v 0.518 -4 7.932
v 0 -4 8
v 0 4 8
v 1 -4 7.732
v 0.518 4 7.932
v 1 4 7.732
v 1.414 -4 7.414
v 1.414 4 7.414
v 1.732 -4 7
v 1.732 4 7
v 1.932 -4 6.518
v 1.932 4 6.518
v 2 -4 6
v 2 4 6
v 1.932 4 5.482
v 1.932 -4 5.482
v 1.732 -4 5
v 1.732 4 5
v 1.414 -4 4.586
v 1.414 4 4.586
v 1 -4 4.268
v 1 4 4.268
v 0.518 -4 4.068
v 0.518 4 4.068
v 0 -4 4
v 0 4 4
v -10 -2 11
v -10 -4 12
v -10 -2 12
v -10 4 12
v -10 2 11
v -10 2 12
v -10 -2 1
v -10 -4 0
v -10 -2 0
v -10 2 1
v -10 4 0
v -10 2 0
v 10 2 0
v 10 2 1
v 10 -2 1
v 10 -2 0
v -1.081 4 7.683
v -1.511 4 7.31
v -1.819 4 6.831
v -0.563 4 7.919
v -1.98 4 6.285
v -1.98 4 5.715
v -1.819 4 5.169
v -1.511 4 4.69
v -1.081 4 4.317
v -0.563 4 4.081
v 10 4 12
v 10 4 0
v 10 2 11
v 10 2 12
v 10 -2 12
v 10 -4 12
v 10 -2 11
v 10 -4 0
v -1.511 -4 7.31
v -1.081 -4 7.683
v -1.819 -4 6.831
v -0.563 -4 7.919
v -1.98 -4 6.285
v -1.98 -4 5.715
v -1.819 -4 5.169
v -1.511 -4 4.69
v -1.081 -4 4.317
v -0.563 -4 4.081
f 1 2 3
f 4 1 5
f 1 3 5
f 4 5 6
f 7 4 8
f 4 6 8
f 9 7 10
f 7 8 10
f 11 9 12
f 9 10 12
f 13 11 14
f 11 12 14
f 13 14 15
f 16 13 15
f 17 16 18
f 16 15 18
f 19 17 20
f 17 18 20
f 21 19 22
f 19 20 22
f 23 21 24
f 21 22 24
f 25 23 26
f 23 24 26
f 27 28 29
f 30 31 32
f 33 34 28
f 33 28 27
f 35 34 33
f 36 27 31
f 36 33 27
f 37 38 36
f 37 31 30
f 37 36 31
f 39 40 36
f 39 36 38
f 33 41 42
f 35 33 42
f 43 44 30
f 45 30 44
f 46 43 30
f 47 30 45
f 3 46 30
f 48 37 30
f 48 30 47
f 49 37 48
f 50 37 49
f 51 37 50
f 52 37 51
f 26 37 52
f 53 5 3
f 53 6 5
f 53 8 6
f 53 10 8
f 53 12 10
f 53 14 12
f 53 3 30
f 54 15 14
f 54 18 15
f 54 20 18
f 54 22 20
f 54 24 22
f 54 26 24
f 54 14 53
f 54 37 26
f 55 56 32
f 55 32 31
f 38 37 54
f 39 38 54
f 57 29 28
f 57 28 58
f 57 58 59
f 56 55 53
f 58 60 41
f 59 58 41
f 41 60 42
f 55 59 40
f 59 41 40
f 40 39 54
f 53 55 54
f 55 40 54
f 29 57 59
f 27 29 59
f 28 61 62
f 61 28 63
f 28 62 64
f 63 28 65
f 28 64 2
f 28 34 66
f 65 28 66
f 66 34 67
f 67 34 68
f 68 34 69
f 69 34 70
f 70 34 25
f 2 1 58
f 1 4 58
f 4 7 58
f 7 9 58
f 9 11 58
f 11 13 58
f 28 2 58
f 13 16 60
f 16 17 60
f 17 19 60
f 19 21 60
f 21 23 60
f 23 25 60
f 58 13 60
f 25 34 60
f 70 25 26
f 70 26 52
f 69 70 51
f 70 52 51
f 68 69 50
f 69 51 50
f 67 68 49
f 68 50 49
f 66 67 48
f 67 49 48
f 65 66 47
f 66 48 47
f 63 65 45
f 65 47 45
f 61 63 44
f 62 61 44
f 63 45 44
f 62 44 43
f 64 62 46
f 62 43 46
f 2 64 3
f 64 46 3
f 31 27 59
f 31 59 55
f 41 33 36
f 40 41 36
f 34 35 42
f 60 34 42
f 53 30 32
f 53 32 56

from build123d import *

# Parameters (mm, degrees)
SKETCH_1_W          = 20
SKETCH_1_H          = 8
EXTRUDE_1_DEPTH     = 12
SKETCH_2_W          = 1
SKETCH_2_H          = 4
CUT_EXTRUDE_3_DEPTH = 21
CUT_EXTRUDE_4_DEPTH = 9


with BuildPart() as part:
    # 草图1 → 凸台-拉伸1 (new body)
    with BuildSketch(Plane.XY):
        Rectangle(SKETCH_1_W, SKETCH_1_H)
    extrude(amount=EXTRUDE_1_DEPTH)

    # 草图2 → 切除-拉伸3 (cut, through all)
    with BuildSketch(Plane(origin=(10, 0, 0), x_dir=(0, 0, -1), z_dir=(1, 0, 0))):
        with Locations((-0.5, 0)):
            Rectangle(SKETCH_2_W, SKETCH_2_H)
        with Locations((-11.5, 0)):
            Rectangle(SKETCH_2_W, SKETCH_2_H)
    extrude(amount=-CUT_EXTRUDE_3_DEPTH, mode=Mode.SUBTRACT)

    # 草图3 → 切除-拉伸4 (cut, through all)
    with BuildSketch(Plane(origin=(0, 4, 0), x_dir=(1, 0, 0), z_dir=(0, 1, 0))):
        with BuildLine():
            ThreePointArc((2, -6), (1.414213562, -4.585786438), (0, -4))
            Line((0, -4), (0, -8))
            ThreePointArc((0, -8), (1.414213562, -7.414213562), (2, -6))
        make_face()
        with BuildLine():
            Line((0, -8), (0, -4))
            ThreePointArc((0, -4), (-2, -6), (0, -8))
        make_face()
    extrude(amount=-CUT_EXTRUDE_4_DEPTH, mode=Mode.SUBTRACT)


solid = part.part
